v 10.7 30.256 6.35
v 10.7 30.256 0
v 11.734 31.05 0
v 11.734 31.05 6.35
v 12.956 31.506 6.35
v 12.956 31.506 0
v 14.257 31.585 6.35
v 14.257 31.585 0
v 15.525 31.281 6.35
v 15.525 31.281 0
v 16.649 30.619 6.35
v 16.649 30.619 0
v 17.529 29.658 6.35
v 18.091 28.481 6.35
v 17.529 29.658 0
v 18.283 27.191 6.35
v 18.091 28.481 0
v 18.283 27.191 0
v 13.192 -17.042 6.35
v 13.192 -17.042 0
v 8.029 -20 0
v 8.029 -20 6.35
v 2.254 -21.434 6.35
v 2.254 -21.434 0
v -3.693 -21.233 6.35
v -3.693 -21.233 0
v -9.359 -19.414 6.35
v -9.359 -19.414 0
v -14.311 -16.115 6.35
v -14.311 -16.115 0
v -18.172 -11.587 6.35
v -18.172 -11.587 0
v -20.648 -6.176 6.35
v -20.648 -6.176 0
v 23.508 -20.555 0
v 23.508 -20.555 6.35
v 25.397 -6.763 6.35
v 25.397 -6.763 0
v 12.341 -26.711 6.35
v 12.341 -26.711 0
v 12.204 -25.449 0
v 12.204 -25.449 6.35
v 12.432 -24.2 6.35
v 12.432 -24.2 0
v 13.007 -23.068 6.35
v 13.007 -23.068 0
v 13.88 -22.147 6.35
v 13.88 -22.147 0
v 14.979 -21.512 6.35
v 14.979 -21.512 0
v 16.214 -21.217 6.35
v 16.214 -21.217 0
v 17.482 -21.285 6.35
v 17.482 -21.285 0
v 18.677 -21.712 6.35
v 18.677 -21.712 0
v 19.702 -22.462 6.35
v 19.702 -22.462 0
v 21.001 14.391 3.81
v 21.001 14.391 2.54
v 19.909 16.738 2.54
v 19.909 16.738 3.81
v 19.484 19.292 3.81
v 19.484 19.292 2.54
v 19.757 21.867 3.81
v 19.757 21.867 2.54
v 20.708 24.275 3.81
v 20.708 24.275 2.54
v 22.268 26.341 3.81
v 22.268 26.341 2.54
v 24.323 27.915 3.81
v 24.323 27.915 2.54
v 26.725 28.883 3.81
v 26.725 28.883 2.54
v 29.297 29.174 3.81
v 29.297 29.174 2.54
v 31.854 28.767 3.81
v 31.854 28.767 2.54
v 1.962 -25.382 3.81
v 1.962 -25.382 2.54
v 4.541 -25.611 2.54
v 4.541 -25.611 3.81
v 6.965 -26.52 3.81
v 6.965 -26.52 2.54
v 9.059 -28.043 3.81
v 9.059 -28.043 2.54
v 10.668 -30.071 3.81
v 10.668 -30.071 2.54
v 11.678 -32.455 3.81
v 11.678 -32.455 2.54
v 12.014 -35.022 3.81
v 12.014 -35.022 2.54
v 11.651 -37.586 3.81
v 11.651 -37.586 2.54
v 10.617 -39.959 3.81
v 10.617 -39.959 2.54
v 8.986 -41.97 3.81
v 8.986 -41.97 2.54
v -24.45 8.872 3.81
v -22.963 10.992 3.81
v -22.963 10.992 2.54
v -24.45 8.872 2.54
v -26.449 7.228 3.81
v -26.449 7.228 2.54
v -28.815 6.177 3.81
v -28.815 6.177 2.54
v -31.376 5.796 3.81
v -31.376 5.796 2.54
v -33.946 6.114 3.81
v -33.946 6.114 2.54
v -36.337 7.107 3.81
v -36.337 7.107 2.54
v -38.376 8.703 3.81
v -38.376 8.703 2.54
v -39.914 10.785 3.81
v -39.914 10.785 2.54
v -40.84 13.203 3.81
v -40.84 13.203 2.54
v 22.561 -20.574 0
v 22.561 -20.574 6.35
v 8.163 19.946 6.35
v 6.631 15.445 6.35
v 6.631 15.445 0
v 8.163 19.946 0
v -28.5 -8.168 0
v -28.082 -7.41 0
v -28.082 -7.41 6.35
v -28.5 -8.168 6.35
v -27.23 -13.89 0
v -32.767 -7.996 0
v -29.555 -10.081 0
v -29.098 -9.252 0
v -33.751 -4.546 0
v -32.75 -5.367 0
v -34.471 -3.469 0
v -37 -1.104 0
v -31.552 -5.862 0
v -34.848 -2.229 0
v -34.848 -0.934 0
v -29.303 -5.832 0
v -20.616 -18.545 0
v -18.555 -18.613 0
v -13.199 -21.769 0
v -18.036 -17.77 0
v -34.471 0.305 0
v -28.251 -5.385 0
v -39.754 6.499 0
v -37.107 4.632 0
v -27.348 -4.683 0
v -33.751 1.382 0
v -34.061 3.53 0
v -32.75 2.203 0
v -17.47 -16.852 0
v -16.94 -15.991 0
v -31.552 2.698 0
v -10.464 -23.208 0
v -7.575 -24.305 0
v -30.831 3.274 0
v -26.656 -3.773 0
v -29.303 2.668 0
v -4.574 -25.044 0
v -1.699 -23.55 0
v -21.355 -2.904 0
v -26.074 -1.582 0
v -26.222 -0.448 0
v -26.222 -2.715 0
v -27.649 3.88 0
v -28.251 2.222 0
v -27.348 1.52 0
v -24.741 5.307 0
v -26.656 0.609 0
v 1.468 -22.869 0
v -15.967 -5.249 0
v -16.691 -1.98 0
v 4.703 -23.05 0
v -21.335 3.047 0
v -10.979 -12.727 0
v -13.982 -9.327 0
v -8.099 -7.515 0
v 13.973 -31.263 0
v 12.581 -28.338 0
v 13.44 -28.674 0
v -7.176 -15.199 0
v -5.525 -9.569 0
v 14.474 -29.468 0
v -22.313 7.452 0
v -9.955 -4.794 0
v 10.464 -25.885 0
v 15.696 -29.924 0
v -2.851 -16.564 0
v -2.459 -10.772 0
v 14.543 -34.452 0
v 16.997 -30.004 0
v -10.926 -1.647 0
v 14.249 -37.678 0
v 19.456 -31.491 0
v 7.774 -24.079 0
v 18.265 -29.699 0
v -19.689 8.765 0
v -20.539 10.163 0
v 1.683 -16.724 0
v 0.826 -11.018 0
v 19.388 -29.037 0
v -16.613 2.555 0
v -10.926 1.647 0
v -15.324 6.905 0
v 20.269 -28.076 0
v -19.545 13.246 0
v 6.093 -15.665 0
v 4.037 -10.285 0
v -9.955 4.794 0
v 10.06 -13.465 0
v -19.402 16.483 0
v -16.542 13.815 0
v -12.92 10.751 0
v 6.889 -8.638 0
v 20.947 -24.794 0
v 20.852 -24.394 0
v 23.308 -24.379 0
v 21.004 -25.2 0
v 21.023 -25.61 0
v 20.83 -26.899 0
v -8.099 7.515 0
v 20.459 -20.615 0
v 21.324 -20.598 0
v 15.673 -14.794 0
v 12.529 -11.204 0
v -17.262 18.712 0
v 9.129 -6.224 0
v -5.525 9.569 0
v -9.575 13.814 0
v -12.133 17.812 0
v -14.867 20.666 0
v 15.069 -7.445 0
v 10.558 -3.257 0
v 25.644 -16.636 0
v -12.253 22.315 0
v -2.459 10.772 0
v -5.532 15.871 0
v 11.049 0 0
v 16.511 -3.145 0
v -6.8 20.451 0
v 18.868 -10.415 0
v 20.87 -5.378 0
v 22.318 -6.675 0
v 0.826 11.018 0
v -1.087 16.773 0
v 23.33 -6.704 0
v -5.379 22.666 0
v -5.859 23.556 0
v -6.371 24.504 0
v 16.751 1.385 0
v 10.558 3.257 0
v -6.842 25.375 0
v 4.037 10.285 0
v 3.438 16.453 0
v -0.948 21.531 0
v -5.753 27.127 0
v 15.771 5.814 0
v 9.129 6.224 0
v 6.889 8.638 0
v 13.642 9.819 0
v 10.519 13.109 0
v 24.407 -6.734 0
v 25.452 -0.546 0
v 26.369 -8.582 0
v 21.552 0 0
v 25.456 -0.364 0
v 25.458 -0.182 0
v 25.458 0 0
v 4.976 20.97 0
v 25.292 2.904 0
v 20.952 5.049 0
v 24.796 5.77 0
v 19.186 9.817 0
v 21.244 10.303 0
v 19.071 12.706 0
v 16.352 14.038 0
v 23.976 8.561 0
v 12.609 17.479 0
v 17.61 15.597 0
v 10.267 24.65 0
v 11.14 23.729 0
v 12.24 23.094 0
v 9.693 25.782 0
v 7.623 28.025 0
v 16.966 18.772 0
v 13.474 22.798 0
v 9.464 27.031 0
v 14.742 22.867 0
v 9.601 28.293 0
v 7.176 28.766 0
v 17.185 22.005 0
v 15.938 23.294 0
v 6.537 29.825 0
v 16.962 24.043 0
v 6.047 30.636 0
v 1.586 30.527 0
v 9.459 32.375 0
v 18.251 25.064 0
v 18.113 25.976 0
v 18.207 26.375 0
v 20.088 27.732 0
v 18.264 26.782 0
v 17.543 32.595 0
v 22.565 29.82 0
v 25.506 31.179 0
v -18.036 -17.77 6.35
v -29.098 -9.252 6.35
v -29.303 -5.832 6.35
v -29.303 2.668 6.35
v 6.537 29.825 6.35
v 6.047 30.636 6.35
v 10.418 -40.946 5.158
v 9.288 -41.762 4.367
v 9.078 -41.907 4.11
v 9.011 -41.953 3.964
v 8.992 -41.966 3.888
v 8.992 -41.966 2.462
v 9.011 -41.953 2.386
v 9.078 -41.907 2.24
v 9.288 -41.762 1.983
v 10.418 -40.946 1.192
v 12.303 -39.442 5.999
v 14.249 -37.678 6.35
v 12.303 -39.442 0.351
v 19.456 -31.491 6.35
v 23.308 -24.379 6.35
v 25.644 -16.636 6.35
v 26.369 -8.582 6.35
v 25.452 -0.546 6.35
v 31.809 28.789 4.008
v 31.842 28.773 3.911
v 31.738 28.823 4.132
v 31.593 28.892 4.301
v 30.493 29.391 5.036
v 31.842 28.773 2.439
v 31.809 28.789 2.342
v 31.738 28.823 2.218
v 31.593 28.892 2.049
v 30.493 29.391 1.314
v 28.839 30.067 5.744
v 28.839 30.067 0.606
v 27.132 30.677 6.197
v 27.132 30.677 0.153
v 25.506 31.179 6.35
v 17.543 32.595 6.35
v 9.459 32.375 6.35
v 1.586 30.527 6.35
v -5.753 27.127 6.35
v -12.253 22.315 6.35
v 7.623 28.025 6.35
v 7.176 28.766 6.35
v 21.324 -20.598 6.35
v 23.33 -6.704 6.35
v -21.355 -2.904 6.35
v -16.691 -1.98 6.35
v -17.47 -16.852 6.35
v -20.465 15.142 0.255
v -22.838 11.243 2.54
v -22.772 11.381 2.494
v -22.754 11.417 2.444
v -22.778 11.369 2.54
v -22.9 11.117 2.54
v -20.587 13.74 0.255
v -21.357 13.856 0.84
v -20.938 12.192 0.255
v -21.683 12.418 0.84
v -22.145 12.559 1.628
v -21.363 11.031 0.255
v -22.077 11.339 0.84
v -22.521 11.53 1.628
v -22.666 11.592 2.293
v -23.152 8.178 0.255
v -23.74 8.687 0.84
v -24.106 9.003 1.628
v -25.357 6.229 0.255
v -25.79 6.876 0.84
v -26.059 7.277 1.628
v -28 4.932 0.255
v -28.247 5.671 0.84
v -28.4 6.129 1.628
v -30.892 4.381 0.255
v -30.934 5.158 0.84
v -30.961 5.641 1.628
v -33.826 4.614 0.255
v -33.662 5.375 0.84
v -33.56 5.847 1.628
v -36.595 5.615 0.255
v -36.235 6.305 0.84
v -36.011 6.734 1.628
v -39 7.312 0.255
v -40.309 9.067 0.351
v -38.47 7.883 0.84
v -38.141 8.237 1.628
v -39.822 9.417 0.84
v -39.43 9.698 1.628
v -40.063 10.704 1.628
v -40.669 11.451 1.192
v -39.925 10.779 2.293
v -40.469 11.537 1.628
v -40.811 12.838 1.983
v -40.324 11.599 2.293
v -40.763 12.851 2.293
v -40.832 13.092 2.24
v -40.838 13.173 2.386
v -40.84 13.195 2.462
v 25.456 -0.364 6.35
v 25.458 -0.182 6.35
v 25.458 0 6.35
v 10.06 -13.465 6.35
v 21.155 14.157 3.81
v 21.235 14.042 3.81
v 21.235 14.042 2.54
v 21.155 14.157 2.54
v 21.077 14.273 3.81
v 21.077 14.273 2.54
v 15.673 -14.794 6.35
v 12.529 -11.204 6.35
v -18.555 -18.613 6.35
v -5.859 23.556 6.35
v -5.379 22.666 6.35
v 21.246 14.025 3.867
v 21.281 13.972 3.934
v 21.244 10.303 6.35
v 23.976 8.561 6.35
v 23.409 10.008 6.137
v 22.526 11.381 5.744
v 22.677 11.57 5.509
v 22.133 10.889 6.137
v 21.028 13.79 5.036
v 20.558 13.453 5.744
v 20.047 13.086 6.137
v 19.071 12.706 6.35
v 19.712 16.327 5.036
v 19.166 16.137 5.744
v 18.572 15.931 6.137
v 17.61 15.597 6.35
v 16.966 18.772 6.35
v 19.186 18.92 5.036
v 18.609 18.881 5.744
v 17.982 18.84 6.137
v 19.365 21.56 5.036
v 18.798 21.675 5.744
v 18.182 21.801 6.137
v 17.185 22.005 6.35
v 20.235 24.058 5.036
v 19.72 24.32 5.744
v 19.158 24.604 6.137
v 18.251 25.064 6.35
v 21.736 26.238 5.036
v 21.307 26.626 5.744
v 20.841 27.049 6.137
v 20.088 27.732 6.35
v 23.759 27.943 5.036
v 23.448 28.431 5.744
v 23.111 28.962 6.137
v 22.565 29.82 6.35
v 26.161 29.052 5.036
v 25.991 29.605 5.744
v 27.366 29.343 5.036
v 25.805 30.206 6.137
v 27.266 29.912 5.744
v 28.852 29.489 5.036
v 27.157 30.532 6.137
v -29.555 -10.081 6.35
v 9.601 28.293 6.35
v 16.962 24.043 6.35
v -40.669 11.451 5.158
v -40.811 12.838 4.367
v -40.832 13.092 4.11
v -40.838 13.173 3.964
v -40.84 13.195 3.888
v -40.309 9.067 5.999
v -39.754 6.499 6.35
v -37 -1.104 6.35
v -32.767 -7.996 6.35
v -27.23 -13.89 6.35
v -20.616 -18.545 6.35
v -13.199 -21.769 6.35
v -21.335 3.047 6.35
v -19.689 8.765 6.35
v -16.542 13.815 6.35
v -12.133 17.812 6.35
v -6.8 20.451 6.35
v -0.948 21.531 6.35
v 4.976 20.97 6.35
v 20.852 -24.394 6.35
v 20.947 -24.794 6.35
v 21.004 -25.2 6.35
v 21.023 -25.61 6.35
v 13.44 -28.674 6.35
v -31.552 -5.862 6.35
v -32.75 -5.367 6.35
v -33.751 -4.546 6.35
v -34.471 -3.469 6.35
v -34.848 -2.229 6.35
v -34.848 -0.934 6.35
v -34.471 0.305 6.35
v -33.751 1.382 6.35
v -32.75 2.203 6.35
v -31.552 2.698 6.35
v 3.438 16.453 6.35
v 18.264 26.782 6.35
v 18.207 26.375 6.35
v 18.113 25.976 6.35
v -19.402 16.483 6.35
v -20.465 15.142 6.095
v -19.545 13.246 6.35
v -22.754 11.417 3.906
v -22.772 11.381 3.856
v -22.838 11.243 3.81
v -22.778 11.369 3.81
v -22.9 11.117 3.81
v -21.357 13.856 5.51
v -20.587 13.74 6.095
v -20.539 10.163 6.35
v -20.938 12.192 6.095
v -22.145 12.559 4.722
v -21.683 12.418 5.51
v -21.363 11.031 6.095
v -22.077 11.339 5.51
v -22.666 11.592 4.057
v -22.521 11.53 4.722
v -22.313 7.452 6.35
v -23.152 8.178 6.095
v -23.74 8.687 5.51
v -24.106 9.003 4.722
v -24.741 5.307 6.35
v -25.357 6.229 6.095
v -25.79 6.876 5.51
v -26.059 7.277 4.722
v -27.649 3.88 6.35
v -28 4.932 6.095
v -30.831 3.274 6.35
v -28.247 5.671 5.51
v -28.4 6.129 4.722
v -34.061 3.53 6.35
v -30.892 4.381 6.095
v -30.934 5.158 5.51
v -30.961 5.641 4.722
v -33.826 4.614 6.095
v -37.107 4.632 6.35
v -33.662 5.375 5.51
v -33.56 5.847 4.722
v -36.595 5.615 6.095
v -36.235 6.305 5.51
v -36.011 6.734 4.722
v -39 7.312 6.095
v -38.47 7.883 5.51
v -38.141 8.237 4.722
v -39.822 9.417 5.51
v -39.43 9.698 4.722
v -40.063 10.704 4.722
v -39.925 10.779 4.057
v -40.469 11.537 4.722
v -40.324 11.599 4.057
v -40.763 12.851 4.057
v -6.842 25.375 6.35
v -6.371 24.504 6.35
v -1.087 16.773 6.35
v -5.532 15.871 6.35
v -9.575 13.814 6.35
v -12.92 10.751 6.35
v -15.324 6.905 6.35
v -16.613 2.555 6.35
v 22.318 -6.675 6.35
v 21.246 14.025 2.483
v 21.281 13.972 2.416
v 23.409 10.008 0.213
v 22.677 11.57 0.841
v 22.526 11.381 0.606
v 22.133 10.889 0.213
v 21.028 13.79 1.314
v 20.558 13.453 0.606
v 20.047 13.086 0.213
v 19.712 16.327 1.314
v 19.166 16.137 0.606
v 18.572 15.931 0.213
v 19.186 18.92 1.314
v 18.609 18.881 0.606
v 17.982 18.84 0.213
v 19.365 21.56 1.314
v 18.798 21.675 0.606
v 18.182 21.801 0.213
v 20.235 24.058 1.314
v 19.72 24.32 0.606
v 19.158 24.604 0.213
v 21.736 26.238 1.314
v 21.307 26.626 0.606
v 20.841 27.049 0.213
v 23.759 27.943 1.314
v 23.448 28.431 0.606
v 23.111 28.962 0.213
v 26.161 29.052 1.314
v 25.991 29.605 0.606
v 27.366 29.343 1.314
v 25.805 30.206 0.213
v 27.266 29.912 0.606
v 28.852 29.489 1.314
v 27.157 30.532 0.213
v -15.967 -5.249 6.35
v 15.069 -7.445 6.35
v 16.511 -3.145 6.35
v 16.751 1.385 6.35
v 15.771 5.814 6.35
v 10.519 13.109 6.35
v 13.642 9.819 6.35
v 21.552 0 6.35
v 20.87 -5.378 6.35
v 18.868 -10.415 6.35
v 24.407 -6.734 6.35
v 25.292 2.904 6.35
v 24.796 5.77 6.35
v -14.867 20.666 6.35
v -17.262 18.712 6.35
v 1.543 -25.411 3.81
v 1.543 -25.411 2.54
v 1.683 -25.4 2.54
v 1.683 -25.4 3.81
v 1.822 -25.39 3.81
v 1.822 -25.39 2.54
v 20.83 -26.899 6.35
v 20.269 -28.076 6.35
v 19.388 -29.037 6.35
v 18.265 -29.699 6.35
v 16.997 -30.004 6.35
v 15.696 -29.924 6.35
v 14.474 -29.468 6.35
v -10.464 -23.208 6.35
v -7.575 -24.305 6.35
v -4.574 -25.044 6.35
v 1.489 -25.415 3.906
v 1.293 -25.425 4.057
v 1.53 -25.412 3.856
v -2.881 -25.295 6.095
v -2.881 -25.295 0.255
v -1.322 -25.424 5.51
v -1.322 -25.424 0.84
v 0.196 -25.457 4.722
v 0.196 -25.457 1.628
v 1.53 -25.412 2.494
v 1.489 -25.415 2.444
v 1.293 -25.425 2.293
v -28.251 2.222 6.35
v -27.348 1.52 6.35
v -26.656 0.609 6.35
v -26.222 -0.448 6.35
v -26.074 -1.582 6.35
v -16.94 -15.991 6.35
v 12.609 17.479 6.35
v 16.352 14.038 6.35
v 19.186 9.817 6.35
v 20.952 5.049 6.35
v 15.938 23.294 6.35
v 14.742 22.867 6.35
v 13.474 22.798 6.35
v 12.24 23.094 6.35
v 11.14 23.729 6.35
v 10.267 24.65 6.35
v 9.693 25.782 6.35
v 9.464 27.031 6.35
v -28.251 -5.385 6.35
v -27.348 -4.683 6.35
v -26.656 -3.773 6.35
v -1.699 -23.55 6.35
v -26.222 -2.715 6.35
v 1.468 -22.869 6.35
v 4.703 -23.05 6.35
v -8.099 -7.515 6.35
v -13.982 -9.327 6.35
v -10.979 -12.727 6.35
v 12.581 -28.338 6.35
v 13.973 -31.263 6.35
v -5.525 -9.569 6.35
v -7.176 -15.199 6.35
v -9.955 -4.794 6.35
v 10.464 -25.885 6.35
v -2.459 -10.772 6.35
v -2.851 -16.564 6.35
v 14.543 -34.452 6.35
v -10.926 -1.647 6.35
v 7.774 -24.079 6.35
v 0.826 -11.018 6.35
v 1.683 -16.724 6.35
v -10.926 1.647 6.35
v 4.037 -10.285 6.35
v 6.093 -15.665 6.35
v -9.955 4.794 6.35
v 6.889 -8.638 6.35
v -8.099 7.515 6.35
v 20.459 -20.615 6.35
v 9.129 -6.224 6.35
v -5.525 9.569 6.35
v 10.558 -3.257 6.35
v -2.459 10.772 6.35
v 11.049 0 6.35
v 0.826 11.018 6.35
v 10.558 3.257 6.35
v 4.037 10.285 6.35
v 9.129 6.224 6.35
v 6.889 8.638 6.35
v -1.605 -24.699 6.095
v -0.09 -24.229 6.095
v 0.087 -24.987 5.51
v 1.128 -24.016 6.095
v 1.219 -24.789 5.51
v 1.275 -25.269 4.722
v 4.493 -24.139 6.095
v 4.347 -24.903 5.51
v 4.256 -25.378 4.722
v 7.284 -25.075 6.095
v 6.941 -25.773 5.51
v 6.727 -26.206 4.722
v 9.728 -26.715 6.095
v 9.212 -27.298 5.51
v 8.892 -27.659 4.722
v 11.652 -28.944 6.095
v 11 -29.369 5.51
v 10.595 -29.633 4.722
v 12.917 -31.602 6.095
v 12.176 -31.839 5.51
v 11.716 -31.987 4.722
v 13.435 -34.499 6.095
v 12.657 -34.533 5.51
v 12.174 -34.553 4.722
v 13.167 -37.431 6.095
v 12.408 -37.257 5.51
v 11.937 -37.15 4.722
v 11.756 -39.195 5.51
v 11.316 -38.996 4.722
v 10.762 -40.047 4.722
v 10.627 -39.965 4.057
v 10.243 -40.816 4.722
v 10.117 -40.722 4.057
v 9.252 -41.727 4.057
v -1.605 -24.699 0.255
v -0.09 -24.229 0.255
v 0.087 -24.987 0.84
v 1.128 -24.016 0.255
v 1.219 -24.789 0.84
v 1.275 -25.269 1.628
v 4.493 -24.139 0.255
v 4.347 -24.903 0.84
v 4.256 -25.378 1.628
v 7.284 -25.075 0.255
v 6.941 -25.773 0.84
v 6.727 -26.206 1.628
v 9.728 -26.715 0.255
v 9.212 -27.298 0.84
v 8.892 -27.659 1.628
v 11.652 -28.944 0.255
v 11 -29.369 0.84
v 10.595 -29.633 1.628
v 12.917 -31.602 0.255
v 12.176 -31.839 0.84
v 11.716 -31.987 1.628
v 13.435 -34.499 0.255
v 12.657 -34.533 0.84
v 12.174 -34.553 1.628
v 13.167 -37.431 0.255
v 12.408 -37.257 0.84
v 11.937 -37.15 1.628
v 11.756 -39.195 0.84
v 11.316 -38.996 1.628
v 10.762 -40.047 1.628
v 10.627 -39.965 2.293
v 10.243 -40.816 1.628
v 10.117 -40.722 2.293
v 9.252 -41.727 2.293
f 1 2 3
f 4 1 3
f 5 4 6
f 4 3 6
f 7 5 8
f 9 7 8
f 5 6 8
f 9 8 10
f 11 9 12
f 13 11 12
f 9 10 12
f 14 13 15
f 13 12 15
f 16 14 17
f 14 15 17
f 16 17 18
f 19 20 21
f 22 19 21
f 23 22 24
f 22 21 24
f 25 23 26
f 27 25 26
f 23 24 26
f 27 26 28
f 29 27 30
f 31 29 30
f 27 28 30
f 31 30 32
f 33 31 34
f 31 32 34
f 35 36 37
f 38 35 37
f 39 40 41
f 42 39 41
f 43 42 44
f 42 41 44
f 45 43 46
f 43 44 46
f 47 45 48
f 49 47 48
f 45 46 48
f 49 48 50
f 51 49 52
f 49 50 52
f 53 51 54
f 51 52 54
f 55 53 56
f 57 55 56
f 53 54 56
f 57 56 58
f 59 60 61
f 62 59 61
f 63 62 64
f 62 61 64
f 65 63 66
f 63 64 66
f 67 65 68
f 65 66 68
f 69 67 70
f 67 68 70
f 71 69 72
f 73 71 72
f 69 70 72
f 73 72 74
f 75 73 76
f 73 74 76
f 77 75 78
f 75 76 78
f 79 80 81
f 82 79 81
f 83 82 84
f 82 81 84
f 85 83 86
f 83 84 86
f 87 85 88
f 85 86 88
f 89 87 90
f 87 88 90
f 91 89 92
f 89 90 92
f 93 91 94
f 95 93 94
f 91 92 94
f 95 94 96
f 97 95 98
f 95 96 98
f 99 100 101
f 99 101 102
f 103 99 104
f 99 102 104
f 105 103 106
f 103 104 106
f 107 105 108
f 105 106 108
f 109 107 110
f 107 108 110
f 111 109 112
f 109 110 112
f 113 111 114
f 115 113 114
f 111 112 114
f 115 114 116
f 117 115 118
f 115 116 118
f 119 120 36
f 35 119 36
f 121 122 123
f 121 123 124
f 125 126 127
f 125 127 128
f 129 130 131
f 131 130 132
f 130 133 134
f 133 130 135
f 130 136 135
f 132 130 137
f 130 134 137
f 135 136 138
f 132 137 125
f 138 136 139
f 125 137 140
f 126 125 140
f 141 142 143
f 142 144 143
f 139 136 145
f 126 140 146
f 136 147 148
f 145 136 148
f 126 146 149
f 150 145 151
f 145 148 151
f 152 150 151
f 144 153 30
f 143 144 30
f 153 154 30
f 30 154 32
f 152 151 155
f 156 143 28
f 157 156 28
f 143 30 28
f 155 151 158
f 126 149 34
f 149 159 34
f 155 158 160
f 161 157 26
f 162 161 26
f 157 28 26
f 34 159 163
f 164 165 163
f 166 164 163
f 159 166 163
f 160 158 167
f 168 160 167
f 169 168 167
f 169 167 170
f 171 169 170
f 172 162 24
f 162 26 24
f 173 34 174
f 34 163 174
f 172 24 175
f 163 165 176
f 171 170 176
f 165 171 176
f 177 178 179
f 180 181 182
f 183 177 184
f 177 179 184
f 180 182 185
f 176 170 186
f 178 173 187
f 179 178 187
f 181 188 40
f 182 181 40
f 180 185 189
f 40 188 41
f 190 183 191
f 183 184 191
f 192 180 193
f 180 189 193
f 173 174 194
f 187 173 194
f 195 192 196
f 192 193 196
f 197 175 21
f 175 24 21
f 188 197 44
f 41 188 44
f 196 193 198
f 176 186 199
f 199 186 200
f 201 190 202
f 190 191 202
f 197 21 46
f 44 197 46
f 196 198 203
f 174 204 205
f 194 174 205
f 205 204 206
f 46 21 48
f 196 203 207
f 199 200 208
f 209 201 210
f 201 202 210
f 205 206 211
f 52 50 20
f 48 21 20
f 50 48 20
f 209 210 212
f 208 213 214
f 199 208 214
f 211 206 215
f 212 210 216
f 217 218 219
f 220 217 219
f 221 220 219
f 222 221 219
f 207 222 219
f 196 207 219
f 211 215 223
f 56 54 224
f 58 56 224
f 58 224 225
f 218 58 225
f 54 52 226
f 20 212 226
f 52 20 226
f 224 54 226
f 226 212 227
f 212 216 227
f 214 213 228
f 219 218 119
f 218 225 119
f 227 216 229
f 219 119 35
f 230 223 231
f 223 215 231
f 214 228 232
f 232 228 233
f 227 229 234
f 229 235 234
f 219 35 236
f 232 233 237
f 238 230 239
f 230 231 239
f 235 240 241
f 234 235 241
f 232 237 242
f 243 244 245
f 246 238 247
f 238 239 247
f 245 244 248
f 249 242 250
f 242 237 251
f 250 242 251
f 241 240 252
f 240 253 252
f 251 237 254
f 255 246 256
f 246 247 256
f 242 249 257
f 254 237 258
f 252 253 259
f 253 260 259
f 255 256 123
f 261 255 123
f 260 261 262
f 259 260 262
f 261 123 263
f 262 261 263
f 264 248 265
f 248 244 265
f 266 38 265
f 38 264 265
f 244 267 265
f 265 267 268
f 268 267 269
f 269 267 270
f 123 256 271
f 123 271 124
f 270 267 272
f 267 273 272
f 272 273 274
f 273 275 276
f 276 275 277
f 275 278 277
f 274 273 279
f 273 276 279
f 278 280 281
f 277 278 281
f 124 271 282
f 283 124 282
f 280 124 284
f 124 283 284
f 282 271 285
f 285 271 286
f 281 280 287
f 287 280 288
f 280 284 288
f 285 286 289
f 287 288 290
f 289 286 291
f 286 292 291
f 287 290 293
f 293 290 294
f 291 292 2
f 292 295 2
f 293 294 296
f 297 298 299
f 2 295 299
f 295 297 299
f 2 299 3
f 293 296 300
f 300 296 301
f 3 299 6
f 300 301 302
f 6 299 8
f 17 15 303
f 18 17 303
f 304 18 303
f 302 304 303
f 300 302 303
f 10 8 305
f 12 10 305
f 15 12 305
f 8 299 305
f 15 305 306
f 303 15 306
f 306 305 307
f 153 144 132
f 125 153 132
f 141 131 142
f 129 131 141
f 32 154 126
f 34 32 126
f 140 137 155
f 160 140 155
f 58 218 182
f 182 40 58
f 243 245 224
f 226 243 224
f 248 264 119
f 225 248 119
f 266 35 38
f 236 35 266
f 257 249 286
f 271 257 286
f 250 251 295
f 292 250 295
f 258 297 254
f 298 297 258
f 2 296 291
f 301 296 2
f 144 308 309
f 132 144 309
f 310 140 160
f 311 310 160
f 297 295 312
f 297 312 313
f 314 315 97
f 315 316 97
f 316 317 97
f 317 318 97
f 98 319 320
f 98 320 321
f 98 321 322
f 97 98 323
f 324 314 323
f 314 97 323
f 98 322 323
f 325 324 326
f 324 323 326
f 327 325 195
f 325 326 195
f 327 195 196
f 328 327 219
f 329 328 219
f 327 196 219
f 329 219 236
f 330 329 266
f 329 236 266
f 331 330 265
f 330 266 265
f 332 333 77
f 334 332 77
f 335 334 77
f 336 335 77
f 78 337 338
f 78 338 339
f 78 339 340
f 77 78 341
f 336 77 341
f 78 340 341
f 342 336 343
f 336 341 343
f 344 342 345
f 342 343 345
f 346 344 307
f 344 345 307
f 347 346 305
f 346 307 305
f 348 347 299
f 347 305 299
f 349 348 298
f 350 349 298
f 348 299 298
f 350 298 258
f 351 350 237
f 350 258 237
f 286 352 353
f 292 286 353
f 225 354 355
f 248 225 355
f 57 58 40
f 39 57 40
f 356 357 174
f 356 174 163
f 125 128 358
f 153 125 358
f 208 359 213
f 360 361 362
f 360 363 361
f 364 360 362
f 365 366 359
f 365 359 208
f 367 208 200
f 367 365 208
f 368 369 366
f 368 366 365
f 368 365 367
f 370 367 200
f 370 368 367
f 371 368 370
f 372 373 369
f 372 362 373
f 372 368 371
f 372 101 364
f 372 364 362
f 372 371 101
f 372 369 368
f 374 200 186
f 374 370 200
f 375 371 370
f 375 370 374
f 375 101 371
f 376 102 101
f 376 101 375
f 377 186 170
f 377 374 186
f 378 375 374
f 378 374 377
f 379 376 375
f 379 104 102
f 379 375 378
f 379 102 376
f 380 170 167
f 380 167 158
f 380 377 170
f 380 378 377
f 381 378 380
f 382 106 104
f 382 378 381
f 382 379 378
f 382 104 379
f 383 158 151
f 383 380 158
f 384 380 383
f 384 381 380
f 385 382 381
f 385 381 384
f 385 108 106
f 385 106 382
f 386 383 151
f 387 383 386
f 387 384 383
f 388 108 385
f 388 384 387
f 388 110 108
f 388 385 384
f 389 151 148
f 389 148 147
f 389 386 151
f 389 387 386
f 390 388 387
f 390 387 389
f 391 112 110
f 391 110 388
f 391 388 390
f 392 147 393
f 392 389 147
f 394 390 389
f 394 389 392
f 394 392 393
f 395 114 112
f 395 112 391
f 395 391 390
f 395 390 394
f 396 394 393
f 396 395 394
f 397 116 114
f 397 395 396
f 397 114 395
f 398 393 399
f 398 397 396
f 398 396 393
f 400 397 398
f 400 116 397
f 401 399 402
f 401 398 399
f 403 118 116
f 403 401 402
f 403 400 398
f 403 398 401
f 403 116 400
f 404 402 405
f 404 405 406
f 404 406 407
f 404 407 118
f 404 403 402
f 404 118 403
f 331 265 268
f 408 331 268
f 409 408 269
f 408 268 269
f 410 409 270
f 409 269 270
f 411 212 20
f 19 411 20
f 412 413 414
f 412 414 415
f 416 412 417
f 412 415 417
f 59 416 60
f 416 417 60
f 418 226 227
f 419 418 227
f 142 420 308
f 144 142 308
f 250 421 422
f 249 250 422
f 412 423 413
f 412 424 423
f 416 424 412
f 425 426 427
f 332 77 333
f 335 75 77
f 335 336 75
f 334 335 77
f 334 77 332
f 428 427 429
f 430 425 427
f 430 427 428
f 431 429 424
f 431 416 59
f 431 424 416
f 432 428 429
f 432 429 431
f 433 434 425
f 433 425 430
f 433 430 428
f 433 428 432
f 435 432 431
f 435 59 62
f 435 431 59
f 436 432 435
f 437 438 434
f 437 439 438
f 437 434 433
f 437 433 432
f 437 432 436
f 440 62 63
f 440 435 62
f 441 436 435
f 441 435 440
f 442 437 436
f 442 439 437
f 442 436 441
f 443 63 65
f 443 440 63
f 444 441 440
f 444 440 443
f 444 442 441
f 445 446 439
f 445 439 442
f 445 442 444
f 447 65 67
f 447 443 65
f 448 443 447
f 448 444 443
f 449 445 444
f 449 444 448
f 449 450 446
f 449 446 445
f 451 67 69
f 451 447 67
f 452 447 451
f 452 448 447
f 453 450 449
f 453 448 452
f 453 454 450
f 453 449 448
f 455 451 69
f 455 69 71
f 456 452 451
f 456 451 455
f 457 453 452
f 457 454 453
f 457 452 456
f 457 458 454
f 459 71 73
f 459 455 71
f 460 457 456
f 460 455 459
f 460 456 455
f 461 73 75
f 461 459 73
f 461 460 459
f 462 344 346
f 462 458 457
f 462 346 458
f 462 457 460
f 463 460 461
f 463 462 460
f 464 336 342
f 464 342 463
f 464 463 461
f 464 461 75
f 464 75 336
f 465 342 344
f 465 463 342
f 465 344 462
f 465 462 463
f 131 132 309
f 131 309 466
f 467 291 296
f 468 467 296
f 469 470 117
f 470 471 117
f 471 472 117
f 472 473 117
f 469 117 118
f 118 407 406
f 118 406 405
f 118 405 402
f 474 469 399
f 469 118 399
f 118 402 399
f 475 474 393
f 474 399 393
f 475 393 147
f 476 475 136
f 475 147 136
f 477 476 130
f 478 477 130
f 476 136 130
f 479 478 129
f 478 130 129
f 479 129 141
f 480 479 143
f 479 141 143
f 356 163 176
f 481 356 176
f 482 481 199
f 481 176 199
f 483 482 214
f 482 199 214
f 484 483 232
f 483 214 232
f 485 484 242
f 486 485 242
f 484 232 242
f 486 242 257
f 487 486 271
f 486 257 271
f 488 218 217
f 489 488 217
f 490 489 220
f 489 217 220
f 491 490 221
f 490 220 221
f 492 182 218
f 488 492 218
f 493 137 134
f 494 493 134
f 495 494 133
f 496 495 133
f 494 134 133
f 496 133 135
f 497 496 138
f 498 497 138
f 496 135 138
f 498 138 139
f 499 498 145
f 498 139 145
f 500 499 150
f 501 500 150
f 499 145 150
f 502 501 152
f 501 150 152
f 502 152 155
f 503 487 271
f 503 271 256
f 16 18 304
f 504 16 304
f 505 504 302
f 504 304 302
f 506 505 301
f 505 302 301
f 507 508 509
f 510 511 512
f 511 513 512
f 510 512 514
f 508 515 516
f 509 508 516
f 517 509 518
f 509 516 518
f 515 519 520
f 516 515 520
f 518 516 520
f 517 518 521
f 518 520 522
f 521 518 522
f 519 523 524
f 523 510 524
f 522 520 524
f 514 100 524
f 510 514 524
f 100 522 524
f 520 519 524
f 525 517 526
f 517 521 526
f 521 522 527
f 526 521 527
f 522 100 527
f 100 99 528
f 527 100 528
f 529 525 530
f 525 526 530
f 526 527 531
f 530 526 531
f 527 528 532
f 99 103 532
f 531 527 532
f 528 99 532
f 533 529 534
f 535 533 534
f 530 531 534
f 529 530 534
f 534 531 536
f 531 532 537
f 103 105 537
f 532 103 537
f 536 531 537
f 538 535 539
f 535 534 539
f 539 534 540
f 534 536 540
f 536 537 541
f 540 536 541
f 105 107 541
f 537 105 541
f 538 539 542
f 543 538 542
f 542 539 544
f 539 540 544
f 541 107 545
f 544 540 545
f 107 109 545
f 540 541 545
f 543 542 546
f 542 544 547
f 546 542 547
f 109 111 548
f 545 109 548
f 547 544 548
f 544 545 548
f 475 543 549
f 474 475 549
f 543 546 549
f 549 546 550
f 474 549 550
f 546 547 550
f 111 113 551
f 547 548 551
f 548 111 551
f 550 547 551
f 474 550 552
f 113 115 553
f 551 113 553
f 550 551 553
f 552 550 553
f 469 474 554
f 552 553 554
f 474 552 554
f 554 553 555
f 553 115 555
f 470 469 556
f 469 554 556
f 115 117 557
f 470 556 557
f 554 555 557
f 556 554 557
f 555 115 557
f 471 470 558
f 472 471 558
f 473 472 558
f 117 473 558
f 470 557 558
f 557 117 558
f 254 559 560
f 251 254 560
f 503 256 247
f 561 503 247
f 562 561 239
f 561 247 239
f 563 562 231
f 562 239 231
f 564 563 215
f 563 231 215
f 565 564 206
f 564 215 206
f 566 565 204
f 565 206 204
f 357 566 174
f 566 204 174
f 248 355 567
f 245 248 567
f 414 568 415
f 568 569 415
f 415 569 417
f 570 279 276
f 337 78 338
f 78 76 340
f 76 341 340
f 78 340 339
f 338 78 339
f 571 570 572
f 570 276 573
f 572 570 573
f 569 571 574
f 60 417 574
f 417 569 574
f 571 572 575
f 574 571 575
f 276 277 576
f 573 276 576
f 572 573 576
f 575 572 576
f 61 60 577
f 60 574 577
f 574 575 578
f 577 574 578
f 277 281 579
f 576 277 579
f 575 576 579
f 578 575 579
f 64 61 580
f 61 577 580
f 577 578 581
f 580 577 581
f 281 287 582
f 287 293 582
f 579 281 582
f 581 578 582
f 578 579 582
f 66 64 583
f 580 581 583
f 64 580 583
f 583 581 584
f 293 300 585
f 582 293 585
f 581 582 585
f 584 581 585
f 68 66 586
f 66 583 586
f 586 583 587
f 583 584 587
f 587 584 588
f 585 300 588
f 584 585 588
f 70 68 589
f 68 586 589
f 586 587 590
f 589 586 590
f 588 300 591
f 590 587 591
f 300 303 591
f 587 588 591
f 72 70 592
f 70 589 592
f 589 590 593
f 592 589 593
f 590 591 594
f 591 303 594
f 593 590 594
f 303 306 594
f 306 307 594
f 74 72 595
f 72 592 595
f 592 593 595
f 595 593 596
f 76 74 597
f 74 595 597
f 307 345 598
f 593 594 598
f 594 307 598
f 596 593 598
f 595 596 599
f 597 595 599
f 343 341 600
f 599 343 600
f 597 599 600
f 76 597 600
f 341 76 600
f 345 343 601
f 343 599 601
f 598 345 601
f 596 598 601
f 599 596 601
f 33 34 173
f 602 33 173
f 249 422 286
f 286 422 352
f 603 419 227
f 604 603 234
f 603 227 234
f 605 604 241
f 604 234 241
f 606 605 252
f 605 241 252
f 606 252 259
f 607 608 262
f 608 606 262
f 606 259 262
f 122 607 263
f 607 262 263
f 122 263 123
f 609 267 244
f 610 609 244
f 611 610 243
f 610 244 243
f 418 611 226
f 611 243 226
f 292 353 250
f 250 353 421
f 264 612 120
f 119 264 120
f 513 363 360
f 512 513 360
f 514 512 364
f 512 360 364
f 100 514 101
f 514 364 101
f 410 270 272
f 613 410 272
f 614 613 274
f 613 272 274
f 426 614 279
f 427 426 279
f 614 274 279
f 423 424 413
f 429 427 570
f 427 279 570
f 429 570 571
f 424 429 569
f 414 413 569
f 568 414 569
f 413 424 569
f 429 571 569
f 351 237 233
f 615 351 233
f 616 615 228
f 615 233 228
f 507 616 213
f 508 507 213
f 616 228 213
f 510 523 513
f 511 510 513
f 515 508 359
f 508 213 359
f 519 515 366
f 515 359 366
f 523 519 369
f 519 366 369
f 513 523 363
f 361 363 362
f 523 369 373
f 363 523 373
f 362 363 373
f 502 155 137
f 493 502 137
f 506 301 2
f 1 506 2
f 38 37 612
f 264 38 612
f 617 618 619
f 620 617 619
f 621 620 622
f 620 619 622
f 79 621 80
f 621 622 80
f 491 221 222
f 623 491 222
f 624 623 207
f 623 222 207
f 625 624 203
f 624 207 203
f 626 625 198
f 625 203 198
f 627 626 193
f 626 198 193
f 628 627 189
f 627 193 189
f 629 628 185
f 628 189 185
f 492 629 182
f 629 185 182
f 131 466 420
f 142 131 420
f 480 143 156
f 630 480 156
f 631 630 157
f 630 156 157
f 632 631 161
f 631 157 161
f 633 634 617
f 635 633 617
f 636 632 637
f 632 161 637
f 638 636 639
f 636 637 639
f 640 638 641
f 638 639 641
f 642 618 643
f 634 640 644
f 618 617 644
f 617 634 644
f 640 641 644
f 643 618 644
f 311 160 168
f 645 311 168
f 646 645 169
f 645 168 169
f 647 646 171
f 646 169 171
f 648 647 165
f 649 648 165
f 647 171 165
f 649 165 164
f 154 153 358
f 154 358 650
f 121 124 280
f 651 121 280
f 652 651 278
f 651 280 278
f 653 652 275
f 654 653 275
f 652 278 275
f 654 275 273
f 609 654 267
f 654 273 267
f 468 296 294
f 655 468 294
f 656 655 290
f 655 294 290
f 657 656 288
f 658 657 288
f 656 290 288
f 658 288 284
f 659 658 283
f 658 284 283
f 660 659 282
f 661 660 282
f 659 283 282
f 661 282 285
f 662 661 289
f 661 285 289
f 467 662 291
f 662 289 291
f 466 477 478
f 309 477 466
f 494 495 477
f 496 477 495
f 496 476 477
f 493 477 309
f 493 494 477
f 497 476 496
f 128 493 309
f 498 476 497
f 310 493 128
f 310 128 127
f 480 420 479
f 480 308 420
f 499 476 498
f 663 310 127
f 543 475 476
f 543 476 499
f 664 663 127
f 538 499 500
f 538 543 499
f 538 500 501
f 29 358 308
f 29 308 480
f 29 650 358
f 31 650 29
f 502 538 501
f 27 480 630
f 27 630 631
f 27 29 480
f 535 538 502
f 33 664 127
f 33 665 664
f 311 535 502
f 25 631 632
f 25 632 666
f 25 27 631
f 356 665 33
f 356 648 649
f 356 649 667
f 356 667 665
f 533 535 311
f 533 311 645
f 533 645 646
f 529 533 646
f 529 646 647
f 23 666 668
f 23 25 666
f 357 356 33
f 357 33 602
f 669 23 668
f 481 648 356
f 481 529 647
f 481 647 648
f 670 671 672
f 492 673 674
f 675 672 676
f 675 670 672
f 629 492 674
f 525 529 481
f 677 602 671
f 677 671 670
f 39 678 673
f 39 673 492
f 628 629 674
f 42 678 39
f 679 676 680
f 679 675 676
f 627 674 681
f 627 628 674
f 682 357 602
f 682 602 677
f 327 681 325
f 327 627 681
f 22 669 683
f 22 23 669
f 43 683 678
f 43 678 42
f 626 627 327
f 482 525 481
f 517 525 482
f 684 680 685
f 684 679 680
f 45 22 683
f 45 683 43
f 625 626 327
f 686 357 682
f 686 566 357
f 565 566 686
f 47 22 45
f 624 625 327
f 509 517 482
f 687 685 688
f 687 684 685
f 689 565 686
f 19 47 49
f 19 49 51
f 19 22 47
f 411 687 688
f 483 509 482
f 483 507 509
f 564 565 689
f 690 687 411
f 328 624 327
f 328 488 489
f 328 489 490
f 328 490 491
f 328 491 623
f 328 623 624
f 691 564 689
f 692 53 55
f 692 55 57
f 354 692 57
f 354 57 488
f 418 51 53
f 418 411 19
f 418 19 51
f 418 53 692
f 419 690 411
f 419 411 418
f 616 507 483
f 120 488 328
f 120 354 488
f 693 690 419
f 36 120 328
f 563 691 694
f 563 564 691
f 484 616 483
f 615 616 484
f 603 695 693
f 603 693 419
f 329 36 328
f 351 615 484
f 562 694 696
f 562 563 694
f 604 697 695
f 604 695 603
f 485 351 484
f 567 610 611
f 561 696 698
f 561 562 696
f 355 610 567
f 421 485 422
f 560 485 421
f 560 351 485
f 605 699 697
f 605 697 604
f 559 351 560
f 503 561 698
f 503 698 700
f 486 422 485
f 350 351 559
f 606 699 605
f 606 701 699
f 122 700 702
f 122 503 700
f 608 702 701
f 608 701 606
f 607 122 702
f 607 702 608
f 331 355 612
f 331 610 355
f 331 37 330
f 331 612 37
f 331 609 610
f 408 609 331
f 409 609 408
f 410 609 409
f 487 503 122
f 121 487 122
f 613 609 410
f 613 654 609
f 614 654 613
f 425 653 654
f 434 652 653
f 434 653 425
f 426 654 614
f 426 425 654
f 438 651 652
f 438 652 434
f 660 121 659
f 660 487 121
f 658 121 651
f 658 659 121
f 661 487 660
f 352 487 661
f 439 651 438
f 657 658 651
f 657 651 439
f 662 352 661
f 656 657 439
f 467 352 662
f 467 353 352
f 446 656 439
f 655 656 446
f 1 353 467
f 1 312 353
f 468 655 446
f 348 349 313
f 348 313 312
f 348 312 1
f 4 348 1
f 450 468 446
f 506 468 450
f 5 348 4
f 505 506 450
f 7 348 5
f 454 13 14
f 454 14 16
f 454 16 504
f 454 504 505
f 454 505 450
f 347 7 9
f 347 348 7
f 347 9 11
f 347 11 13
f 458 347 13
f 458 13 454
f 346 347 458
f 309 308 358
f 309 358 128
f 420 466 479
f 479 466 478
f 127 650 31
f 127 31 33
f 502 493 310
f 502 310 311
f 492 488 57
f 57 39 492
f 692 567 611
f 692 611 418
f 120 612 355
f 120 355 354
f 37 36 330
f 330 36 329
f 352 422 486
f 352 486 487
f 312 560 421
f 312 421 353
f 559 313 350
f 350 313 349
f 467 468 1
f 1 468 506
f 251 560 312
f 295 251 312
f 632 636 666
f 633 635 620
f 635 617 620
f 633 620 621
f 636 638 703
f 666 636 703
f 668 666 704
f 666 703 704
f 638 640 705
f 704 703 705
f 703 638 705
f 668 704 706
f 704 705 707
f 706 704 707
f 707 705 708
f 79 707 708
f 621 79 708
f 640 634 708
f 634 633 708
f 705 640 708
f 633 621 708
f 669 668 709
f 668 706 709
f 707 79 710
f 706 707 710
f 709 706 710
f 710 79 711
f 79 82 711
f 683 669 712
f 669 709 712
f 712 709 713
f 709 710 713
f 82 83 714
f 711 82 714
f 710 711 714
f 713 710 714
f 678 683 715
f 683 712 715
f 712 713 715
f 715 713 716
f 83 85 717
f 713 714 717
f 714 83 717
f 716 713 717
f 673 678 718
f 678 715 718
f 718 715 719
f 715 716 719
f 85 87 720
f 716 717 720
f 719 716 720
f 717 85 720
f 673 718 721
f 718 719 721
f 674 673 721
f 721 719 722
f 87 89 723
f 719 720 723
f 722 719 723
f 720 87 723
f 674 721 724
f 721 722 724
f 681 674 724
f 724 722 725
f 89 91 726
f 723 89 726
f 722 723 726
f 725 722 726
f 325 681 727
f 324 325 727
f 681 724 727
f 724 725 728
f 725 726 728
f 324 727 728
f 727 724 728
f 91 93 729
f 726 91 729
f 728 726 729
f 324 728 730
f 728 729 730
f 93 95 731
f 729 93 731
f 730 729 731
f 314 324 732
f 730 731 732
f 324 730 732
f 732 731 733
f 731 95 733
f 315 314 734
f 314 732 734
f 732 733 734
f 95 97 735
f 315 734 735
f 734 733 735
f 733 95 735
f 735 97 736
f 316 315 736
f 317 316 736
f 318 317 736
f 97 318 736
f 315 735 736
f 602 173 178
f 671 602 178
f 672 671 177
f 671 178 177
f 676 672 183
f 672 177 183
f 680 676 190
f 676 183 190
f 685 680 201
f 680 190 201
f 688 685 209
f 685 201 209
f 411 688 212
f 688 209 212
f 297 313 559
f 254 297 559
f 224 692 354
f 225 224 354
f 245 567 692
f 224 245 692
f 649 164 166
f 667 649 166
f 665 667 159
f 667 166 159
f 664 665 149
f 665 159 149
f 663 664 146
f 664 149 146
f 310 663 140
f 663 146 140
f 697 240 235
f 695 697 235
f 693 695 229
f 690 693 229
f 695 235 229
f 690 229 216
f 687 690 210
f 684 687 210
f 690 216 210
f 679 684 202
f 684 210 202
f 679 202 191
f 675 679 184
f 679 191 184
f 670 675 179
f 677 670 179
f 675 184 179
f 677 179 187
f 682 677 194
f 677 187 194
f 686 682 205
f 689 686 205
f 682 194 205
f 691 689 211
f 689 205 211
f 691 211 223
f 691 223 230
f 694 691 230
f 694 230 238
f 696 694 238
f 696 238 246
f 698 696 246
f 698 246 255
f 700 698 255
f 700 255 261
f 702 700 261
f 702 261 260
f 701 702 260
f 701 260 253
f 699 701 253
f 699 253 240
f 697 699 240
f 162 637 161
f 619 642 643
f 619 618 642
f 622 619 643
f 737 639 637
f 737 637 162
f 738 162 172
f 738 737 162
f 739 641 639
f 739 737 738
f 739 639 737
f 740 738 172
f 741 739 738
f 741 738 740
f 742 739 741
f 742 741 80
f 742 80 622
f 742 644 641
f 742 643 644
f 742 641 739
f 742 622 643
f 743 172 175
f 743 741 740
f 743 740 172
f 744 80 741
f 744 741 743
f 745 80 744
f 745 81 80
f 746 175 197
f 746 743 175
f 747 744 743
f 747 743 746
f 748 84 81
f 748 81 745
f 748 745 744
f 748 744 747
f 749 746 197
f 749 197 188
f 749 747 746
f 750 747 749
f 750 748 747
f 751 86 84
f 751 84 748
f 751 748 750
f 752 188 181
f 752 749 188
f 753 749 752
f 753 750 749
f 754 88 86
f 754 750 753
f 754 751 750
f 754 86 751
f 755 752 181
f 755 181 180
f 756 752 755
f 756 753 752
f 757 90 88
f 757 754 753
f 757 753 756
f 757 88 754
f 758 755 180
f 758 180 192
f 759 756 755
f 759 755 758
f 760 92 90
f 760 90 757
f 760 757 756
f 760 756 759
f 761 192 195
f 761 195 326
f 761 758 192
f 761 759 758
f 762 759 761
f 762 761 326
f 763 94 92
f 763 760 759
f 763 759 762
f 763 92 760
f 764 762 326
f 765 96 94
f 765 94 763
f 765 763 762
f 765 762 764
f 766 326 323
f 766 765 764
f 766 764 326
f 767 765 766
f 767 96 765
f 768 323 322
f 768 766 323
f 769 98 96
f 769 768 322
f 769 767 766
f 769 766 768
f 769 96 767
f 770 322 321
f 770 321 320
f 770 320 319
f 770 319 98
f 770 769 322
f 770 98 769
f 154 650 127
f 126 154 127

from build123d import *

# Parameters (mm, degrees)
F1_DEPTH     = 6.35
F2_R         = 11.049
F3_DEPTH     = 25.4
F5_DEPTH     = 25.4
F7_DEPTH     = 25.4
F8_T2_ANGLE  = 244.4198027275
F8_T4_ANGLE  = 244.4198027276
F8_T6_ANGLE  = 244.4198027276
F8_T8_ANGLE  = 244.4198027276
F8_T10_ANGLE = 244.4198027275
F8_T12_ANGLE = 244.4198027276
F9_R         = 11.2522
F10_DEPTH    = 25.4
F12_DEPTH    = 25.4


# Not quite as in the source:
# - a fillet or chamfer that OpenCascade refuses, or shapes differently, is made with other operations: its cross-section is extruded or revolved along the edge and cut away or added


with BuildPart() as f1:
    # F0 (on Top) → F1 (new body)
    with BuildSketch(Plane.XY):
        with BuildLine():
            ThreePointArc((25.4522914495, -0.5462737247), (25.4566875826, -0.2731525857), (25.4581530165, 0))
            ThreePointArc((25.4581530165, 0), (24.3796049896, 7.3316038874), (21.2353474165, 14.0419932742))
            ThreePointArc((21.2353474165, 14.0419932742), (21.1161182893, 14.2149891818), (21.000703446, 14.3905527964))
            ThreePointArc((21.000703446, 14.3905527964), (5.9018125459, 24.7646151532), (-12.2530588017, 22.3154678422))
            ThreePointArc((-12.2530588017, 22.3154678422), (-18.3508874647, 17.6454663942), (-22.7783966035, 11.3693536837))
            ThreePointArc((-22.7783966035, 11.3693536837), (-22.8686008906, 11.1796002769), (-22.9629360192, 10.9918662834))
            ThreePointArc((-22.9629360192, 10.9918662834), (-24.3976921105, -7.2711879835), (-13.1992326478, -21.7691941174))
            ThreePointArc((-13.1992326478, -21.7691941174), (-6.1059784266, -24.7150679236), (1.543049187, -25.411346958))
            ThreePointArc((1.543049187, -25.411346958), (1.7524826013, -25.3945894587), (1.9622325732, -25.3824190798))
            ThreePointArc((1.9622325732, -25.3824190798), (18.4958795647, -17.4934271697), (25.4522914495, -0.5462737247))
        make_face()
        with BuildLine():
            ThreePointArc((-40.840152687, 13.2027706404), (-32.3672544542, -8.5097837592), (-13.1992326478, -21.7691941174))
            ThreePointArc((-13.1992326478, -21.7691941174), (-24.3976921105, -7.2711879835), (-22.9629360192, 10.9918662834))
            ThreePointArc((-22.9629360192, 10.9918662834), (-32.671913716, 5.8681661373), (-40.840152687, 13.2027706404))
        make_face()
        with BuildLine():
            ThreePointArc((-12.2530588017, 22.3154678422), (5.9018125459, 24.7646151532), (21.000703446, 14.3905527964))
            ThreePointArc((21.000703446, 14.3905527964), (21.4179378065, 25.3606241997), (31.8540111184, 28.7672244012))
            ThreePointArc((31.8540111184, 28.7672244012), (8.8139383109, 32.2857564877), (-12.2530588017, 22.3154678422))
        make_face()
        with BuildLine():
            ThreePointArc((8.9861415686, -41.9699950416), (23.5533161433, -23.7759727285), (25.4522914495, -0.5462737247))
            ThreePointArc((25.4522914495, -0.5462737247), (18.4958795647, -17.4934271697), (1.9622325732, -25.3824190798))
            ThreePointArc((1.9622325732, -25.3824190798), (11.2539759095, -31.2287903369), (8.9861415686, -41.9699950416))
        make_face()
    extrude(amount=F1_DEPTH)

    # F2 (on face) → F3 (cut)
    with BuildSketch(Plane(origin=(0, 0, 0), x_dir=(1, 0, 0), z_dir=(0, 0, -1))):
        Circle(F2_R)
    extrude(amount=-F3_DEPTH, mode=Mode.SUBTRACT)

    # F4 (on face) → F5 (cut)
    with BuildSketch(Plane(origin=(0, 0, 0), x_dir=(1, 0, 0), z_dir=(0, 0, -1))):
        with BuildLine():
            ThreePointArc((-15.9673679457, 5.2488333315), (-5.0596183633, 16.0283296844), (10.0600734805, 13.4648435572))
            Line((10.0600734805, 13.4648435572), (13.19237559, 17.0424425012))
            ThreePointArc((13.19237559, 17.0424425012), (-6.5891713979, 20.5199035183), (-20.6480469686, 6.1759028892))
            Line((-20.6480469686, 6.1759028892), (-15.9673679457, 5.2488333315))
        make_face()
        with BuildLine():
            ThreePointArc((12.5293069781, 11.2037296068), (15.7018951262, 5.9964639497), (16.8079472409, 0))
            ThreePointArc((16.8079472409, 0), (14.03492488, -9.2481335449), (6.6308598383, -15.4447009767))
            Line((6.6308598383, -15.4447009767), (8.1630003536, -19.9461536478))
            ThreePointArc((8.1630003536, -19.9461536478), (17.8942957524, -12.0115694078), (21.551882055, 0))
            ThreePointArc((21.551882055, 0), (20.0281771041, 7.9596320267), (15.6725122776, 14.7937817687))
            Line((15.6725122776, 14.7937817687), (12.5293069781, 11.2037296068))
        make_face()
        with BuildLine():
            Line((4.975534691, -20.9696846579), (3.4380609675, -16.4525629383))
            ThreePointArc((3.4380609675, -16.4525629383), (-11.3511315053, -12.3959228782), (-16.6909333188, 1.9798574195))
            Line((-16.6909333188, 1.9798574195), (-21.3553759436, 2.9037111466))
            ThreePointArc((-21.3553759436, 2.9037111466), (-14.4761720311, -15.9663415797), (4.975534691, -20.9696846579))
        make_face()
    extrude(amount=-F5_DEPTH, mode=Mode.SUBTRACT)

    # F6 (on face) → F7 (cut)
    with BuildSketch(Plane(origin=(0, 0, 0), x_dir=(1, 0, 0), z_dir=(0, 0, -1))):
        with BuildLine():
            Line((-31.5523461387, -2.6979510549), (-31.5523461387, 5.8615701514))
            ThreePointArc((-31.5523461387, 5.8615701514), (-34.8955742826, 1.5818095483), (-31.5523461387, -2.6979510549))
        make_face()
        with BuildLine():
            ThreePointArc((-29.303277888, -2.6679827758), (-26.9727125071, -1.0870330259), (-26.0737039307, 1.5818095483))
            ThreePointArc((-26.0737039307, 1.5818095483), (-26.9727125071, 4.2506521224), (-29.303277888, 5.8316018723))
            Line((-29.303277888, 5.8316018723), (-29.303277888, -2.6679827758))
        make_face()
        with BuildLine():
            ThreePointArc((20.8524417265, 24.3943482294), (20.9802584593, 24.9959924433), (21.023141982, 25.6095671174))
            ThreePointArc((21.023141982, 25.6095671174), (18.2648613778, 29.6991981513), (13.4396789177, 28.6741088325))
            Line((13.4396789177, 28.6741088325), (20.8524417265, 24.3943482294))
        make_face()
        with BuildLine():
            Line((19.7019543101, 22.461582129), (12.3410980833, 26.711374453))
            ThreePointArc((12.3410980833, 26.711374453), (14.4067392181, 21.7895852006), (19.7019543101, 22.461582129))
        make_face()
        with BuildLine():
            Line((9.6013235778, -28.2931840013), (16.9621798046, -24.0433916772))
            ThreePointArc((16.9621798046, -24.0433916772), (11.6669647126, -23.3713947489), (9.6013235778, -28.2931840013))
        make_face()
        with BuildLine():
            ThreePointArc((10.6999044122, -30.2559183808), (15.5250868723, -31.2810076995), (18.2833674765, -27.1913766657))
            ThreePointArc((18.2833674765, -27.1913766657), (18.2404839539, -26.5778019915), (18.112667221, -25.9761577777))
            Line((18.112667221, -25.9761577777), (10.6999044122, -30.2559183808))
        make_face()
    extrude(amount=-F7_DEPTH, mode=Mode.SUBTRACT)

    # F8: fillet of radius 2.54 on 6 edges, made by hand

    # F8_s1 → F8_t2 (revolve, cut)
    with BuildSketch(Plane(origin=(-16.1639945801, -15.1453497234, 0), x_dir=(0, 0, 1), z_dir=(-0.7297262835, -0.6837393883, 0))):
        with BuildLine():
            ThreePointArc((6.35, -15.029889874), (5.6060512242, -16.8259410982), (3.81, -17.569889874))
            Line((3.81, -17.569889874), (6.35, -17.569889874))
            Line((6.35, -17.569889874), (6.35, -15.029889874))
        make_face()
    revolve(axis=Axis((2.4134385694, -34.9722625532, 6.35), (0, 0, -1)), revolution_arc=F8_T2_ANGLE, mode=Mode.SUBTRACT)

    # F8_s3 → F8_t4 (revolve, cut)
    with BuildSketch(Plane(origin=(-5.0342603196, 21.5711047947, 0), x_dir=(0, 0, 1), z_dir=(-0.2272725381, 0.9738311935, 0))):
        with BuildLine():
            ThreePointArc((6.35, -15.029889874), (5.6060512242, -16.8259410982), (3.81, -17.569889874))
            Line((3.81, -17.569889874), (6.35, -17.569889874))
            Line((6.35, -17.569889874), (6.35, -15.029889874))
        make_face()
    revolve(axis=Axis((-31.4935870836, 15.396032165, 6.35), (0, 0, -1)), revolution_arc=F8_T4_ANGLE, mode=Mode.SUBTRACT)

    # F8_s5 → F8_t6 (revolve, cut)
    with BuildSketch(Plane(origin=(21.1982548997, -6.4257550714, 0), x_dir=(0, 0, 1), z_dir=(0.9569988216, -0.2900918052, 0))):
        with BuildLine():
            ThreePointArc((3.81, -17.569889874), (5.6060512242, -16.8259410982), (6.35, -15.029889874))
            Line((6.35, -15.029889874), (6.35, -17.569889874))
            Line((6.35, -17.569889874), (3.81, -17.569889874))
        make_face()
    revolve(axis=Axis((29.0801485142, 19.5762303882, 6.35), (0, 0, -1)), revolution_arc=F8_T6_ANGLE, mode=Mode.SUBTRACT)

    # F8_s7 → F8_t8 (revolve, cut)
    with BuildSketch(Plane(origin=(-5.0342603196, 21.5711047947, 0), x_dir=(0, 0, 1), z_dir=(-0.2272725381, 0.9738311935, 0))):
        with BuildLine():
            ThreePointArc((0, -15.029889874), (0.7439487758, -16.8259410982), (2.54, -17.569889874))
            Line((2.54, -17.569889874), (0, -17.569889874))
            Line((0, -17.569889874), (0, -15.029889874))
        make_face()
    revolve(axis=Axis((-31.4935870836, 15.396032165, 0), (0, 0, -1)), revolution_arc=F8_T8_ANGLE, mode=Mode.SUBTRACT)

    # F8_s9 → F8_t10 (revolve, cut)
    with BuildSketch(Plane(origin=(-16.1639945801, -15.1453497234, 0), x_dir=(0, 0, 1), z_dir=(-0.7297262835, -0.6837393883, 0))):
        with BuildLine():
            ThreePointArc((0, -15.029889874), (0.7439487758, -16.8259410982), (2.54, -17.569889874))
            Line((2.54, -17.569889874), (0, -17.569889874))
            Line((0, -17.569889874), (0, -15.029889874))
        make_face()
    revolve(axis=Axis((2.4134385694, -34.9722625532, 0), (0, 0, -1)), revolution_arc=F8_T10_ANGLE, mode=Mode.SUBTRACT)

    # F8_s11 → F8_t12 (revolve, cut)
    with BuildSketch(Plane(origin=(21.1982548997, -6.4257550714, 0), x_dir=(0, 0, 1), z_dir=(0.9569988216, -0.2900918052, 0))):
        with BuildLine():
            ThreePointArc((2.54, -17.569889874), (0.7439487758, -16.8259410982), (0, -15.029889874))
            Line((0, -15.029889874), (0, -17.569889874))
            Line((0, -17.569889874), (2.54, -17.569889874))
        make_face()
    revolve(axis=Axis((29.0801485142, 19.5762303882, 0), (0, 0, -1)), revolution_arc=F8_T12_ANGLE, mode=Mode.SUBTRACT)

    # F9 (on Top) → F10 (cut)
    with BuildSketch(Plane.XY):
        Circle(F9_R)
    extrude(amount=-F10_DEPTH, mode=Mode.SUBTRACT)

    # F11 (on face) → F12 (cut)
    with BuildSketch(Plane.XY.offset(6.35)):
        Polygon((6.5367808275, 29.8250825475), (6.0469240758, 30.6364076297), (-6.8415322731, 25.3754631249), (-6.3712364353, 24.5042187493), align=None)
        Polygon((7.6234762433, 28.0252436261), (7.1763426779, 28.7658084453), (-5.8592754632, 23.5557878219), (-5.3787292375, 22.6655541377), align=None)
        Polygon((22.5608887424, -20.5735595293), (23.5084452502, -20.5549936793), (25.3965618355, -6.7627908131), (24.4068941544, -6.7344567681), align=None)
        Polygon((20.4588348058, -20.6147459049), (21.3237495351, -20.597799288), (23.3295483915, -6.7036125121), (22.3183102928, -6.6746609091), align=None)
        Polygon((-29.0976695699, -9.2515230182), (-29.5553693259, -10.0814139505), (-18.5550295624, -18.6126723118), (-18.0356577191, -17.7697619811), align=None)
        Polygon((-28.0823110491, -7.4104977212), (-28.500092213, -8.1680091574), (-17.4702729283, -16.8521753098), (-16.9395810553, -15.9908932286), align=None)
    extrude(amount=-F12_DEPTH, mode=Mode.SUBTRACT)


solid = f1.part
